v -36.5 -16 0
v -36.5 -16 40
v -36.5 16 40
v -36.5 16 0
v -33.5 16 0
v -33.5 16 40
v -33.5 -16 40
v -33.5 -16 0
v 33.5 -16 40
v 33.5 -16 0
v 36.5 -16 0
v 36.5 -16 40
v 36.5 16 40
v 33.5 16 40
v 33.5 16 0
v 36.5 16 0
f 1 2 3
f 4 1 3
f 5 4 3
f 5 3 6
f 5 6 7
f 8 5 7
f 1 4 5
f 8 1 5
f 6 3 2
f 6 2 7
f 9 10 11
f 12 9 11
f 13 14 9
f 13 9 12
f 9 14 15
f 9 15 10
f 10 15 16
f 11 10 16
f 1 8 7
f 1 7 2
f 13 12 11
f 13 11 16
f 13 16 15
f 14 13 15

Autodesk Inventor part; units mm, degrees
ref_plane "YZ Plane" through (0, 0, 0) normal (1, 0, 0) x (0, 1, 0)
ref_plane "XZ Plane" through (0, 0, 0) normal (0, 1, 0) x (-1, 0, 0)
ref_plane "XY Plane" through (0, 0, 0) normal (0, 0, 1) x (1, 0, 0)
sketch "Sketch1" plane through (0, 0, 0) normal (0, 0, 1) x (1, 0, 0)
  line L0 (-36.5, 16) -> (36.5, 16) construction
  line L1 (-36.5, 16) -> (-33.5, 16)
  line L2 (-33.5, 16) -> (-33.5, -16)
  line L3 (-33.5, -16) -> (-36.5, -16)
  line L4 (-36.5, -16) -> (-36.5, 16)
  line L5 (0, 16) -> (0, -16) construction
  line L6 (36.5, 16) -> (33.5, 16)
  line L7 (33.5, 16) -> (33.5, -16)
  line L8 (33.5, -16) -> (36.5, -16)
  line L9 (36.5, -16) -> (36.5, 16)
  point P0 (0, 0)
  dimension "d0" = 73
  dimension "d1" = 3
  dimension "d2" = 32
  dimension "d3" = 16
extrude "Extrusion1" add sketch "Sketch1" along normal blind 40
equation "\"d0\" = Esla_Bas_Largo"
equation "\"d1\" = Esla_Bas_Espesor"
equation "\"d2\" = Esla_Bas_Ancho"
equation "\"Esla_Bas_Largo\" = 73"
equation "\"Esla_Bas_Espesor\" = 3"
equation "\"Esla_Bas_Ancho\" = 32"
properties part number "Eslabón2_Largo" material "Stainless Steel"
